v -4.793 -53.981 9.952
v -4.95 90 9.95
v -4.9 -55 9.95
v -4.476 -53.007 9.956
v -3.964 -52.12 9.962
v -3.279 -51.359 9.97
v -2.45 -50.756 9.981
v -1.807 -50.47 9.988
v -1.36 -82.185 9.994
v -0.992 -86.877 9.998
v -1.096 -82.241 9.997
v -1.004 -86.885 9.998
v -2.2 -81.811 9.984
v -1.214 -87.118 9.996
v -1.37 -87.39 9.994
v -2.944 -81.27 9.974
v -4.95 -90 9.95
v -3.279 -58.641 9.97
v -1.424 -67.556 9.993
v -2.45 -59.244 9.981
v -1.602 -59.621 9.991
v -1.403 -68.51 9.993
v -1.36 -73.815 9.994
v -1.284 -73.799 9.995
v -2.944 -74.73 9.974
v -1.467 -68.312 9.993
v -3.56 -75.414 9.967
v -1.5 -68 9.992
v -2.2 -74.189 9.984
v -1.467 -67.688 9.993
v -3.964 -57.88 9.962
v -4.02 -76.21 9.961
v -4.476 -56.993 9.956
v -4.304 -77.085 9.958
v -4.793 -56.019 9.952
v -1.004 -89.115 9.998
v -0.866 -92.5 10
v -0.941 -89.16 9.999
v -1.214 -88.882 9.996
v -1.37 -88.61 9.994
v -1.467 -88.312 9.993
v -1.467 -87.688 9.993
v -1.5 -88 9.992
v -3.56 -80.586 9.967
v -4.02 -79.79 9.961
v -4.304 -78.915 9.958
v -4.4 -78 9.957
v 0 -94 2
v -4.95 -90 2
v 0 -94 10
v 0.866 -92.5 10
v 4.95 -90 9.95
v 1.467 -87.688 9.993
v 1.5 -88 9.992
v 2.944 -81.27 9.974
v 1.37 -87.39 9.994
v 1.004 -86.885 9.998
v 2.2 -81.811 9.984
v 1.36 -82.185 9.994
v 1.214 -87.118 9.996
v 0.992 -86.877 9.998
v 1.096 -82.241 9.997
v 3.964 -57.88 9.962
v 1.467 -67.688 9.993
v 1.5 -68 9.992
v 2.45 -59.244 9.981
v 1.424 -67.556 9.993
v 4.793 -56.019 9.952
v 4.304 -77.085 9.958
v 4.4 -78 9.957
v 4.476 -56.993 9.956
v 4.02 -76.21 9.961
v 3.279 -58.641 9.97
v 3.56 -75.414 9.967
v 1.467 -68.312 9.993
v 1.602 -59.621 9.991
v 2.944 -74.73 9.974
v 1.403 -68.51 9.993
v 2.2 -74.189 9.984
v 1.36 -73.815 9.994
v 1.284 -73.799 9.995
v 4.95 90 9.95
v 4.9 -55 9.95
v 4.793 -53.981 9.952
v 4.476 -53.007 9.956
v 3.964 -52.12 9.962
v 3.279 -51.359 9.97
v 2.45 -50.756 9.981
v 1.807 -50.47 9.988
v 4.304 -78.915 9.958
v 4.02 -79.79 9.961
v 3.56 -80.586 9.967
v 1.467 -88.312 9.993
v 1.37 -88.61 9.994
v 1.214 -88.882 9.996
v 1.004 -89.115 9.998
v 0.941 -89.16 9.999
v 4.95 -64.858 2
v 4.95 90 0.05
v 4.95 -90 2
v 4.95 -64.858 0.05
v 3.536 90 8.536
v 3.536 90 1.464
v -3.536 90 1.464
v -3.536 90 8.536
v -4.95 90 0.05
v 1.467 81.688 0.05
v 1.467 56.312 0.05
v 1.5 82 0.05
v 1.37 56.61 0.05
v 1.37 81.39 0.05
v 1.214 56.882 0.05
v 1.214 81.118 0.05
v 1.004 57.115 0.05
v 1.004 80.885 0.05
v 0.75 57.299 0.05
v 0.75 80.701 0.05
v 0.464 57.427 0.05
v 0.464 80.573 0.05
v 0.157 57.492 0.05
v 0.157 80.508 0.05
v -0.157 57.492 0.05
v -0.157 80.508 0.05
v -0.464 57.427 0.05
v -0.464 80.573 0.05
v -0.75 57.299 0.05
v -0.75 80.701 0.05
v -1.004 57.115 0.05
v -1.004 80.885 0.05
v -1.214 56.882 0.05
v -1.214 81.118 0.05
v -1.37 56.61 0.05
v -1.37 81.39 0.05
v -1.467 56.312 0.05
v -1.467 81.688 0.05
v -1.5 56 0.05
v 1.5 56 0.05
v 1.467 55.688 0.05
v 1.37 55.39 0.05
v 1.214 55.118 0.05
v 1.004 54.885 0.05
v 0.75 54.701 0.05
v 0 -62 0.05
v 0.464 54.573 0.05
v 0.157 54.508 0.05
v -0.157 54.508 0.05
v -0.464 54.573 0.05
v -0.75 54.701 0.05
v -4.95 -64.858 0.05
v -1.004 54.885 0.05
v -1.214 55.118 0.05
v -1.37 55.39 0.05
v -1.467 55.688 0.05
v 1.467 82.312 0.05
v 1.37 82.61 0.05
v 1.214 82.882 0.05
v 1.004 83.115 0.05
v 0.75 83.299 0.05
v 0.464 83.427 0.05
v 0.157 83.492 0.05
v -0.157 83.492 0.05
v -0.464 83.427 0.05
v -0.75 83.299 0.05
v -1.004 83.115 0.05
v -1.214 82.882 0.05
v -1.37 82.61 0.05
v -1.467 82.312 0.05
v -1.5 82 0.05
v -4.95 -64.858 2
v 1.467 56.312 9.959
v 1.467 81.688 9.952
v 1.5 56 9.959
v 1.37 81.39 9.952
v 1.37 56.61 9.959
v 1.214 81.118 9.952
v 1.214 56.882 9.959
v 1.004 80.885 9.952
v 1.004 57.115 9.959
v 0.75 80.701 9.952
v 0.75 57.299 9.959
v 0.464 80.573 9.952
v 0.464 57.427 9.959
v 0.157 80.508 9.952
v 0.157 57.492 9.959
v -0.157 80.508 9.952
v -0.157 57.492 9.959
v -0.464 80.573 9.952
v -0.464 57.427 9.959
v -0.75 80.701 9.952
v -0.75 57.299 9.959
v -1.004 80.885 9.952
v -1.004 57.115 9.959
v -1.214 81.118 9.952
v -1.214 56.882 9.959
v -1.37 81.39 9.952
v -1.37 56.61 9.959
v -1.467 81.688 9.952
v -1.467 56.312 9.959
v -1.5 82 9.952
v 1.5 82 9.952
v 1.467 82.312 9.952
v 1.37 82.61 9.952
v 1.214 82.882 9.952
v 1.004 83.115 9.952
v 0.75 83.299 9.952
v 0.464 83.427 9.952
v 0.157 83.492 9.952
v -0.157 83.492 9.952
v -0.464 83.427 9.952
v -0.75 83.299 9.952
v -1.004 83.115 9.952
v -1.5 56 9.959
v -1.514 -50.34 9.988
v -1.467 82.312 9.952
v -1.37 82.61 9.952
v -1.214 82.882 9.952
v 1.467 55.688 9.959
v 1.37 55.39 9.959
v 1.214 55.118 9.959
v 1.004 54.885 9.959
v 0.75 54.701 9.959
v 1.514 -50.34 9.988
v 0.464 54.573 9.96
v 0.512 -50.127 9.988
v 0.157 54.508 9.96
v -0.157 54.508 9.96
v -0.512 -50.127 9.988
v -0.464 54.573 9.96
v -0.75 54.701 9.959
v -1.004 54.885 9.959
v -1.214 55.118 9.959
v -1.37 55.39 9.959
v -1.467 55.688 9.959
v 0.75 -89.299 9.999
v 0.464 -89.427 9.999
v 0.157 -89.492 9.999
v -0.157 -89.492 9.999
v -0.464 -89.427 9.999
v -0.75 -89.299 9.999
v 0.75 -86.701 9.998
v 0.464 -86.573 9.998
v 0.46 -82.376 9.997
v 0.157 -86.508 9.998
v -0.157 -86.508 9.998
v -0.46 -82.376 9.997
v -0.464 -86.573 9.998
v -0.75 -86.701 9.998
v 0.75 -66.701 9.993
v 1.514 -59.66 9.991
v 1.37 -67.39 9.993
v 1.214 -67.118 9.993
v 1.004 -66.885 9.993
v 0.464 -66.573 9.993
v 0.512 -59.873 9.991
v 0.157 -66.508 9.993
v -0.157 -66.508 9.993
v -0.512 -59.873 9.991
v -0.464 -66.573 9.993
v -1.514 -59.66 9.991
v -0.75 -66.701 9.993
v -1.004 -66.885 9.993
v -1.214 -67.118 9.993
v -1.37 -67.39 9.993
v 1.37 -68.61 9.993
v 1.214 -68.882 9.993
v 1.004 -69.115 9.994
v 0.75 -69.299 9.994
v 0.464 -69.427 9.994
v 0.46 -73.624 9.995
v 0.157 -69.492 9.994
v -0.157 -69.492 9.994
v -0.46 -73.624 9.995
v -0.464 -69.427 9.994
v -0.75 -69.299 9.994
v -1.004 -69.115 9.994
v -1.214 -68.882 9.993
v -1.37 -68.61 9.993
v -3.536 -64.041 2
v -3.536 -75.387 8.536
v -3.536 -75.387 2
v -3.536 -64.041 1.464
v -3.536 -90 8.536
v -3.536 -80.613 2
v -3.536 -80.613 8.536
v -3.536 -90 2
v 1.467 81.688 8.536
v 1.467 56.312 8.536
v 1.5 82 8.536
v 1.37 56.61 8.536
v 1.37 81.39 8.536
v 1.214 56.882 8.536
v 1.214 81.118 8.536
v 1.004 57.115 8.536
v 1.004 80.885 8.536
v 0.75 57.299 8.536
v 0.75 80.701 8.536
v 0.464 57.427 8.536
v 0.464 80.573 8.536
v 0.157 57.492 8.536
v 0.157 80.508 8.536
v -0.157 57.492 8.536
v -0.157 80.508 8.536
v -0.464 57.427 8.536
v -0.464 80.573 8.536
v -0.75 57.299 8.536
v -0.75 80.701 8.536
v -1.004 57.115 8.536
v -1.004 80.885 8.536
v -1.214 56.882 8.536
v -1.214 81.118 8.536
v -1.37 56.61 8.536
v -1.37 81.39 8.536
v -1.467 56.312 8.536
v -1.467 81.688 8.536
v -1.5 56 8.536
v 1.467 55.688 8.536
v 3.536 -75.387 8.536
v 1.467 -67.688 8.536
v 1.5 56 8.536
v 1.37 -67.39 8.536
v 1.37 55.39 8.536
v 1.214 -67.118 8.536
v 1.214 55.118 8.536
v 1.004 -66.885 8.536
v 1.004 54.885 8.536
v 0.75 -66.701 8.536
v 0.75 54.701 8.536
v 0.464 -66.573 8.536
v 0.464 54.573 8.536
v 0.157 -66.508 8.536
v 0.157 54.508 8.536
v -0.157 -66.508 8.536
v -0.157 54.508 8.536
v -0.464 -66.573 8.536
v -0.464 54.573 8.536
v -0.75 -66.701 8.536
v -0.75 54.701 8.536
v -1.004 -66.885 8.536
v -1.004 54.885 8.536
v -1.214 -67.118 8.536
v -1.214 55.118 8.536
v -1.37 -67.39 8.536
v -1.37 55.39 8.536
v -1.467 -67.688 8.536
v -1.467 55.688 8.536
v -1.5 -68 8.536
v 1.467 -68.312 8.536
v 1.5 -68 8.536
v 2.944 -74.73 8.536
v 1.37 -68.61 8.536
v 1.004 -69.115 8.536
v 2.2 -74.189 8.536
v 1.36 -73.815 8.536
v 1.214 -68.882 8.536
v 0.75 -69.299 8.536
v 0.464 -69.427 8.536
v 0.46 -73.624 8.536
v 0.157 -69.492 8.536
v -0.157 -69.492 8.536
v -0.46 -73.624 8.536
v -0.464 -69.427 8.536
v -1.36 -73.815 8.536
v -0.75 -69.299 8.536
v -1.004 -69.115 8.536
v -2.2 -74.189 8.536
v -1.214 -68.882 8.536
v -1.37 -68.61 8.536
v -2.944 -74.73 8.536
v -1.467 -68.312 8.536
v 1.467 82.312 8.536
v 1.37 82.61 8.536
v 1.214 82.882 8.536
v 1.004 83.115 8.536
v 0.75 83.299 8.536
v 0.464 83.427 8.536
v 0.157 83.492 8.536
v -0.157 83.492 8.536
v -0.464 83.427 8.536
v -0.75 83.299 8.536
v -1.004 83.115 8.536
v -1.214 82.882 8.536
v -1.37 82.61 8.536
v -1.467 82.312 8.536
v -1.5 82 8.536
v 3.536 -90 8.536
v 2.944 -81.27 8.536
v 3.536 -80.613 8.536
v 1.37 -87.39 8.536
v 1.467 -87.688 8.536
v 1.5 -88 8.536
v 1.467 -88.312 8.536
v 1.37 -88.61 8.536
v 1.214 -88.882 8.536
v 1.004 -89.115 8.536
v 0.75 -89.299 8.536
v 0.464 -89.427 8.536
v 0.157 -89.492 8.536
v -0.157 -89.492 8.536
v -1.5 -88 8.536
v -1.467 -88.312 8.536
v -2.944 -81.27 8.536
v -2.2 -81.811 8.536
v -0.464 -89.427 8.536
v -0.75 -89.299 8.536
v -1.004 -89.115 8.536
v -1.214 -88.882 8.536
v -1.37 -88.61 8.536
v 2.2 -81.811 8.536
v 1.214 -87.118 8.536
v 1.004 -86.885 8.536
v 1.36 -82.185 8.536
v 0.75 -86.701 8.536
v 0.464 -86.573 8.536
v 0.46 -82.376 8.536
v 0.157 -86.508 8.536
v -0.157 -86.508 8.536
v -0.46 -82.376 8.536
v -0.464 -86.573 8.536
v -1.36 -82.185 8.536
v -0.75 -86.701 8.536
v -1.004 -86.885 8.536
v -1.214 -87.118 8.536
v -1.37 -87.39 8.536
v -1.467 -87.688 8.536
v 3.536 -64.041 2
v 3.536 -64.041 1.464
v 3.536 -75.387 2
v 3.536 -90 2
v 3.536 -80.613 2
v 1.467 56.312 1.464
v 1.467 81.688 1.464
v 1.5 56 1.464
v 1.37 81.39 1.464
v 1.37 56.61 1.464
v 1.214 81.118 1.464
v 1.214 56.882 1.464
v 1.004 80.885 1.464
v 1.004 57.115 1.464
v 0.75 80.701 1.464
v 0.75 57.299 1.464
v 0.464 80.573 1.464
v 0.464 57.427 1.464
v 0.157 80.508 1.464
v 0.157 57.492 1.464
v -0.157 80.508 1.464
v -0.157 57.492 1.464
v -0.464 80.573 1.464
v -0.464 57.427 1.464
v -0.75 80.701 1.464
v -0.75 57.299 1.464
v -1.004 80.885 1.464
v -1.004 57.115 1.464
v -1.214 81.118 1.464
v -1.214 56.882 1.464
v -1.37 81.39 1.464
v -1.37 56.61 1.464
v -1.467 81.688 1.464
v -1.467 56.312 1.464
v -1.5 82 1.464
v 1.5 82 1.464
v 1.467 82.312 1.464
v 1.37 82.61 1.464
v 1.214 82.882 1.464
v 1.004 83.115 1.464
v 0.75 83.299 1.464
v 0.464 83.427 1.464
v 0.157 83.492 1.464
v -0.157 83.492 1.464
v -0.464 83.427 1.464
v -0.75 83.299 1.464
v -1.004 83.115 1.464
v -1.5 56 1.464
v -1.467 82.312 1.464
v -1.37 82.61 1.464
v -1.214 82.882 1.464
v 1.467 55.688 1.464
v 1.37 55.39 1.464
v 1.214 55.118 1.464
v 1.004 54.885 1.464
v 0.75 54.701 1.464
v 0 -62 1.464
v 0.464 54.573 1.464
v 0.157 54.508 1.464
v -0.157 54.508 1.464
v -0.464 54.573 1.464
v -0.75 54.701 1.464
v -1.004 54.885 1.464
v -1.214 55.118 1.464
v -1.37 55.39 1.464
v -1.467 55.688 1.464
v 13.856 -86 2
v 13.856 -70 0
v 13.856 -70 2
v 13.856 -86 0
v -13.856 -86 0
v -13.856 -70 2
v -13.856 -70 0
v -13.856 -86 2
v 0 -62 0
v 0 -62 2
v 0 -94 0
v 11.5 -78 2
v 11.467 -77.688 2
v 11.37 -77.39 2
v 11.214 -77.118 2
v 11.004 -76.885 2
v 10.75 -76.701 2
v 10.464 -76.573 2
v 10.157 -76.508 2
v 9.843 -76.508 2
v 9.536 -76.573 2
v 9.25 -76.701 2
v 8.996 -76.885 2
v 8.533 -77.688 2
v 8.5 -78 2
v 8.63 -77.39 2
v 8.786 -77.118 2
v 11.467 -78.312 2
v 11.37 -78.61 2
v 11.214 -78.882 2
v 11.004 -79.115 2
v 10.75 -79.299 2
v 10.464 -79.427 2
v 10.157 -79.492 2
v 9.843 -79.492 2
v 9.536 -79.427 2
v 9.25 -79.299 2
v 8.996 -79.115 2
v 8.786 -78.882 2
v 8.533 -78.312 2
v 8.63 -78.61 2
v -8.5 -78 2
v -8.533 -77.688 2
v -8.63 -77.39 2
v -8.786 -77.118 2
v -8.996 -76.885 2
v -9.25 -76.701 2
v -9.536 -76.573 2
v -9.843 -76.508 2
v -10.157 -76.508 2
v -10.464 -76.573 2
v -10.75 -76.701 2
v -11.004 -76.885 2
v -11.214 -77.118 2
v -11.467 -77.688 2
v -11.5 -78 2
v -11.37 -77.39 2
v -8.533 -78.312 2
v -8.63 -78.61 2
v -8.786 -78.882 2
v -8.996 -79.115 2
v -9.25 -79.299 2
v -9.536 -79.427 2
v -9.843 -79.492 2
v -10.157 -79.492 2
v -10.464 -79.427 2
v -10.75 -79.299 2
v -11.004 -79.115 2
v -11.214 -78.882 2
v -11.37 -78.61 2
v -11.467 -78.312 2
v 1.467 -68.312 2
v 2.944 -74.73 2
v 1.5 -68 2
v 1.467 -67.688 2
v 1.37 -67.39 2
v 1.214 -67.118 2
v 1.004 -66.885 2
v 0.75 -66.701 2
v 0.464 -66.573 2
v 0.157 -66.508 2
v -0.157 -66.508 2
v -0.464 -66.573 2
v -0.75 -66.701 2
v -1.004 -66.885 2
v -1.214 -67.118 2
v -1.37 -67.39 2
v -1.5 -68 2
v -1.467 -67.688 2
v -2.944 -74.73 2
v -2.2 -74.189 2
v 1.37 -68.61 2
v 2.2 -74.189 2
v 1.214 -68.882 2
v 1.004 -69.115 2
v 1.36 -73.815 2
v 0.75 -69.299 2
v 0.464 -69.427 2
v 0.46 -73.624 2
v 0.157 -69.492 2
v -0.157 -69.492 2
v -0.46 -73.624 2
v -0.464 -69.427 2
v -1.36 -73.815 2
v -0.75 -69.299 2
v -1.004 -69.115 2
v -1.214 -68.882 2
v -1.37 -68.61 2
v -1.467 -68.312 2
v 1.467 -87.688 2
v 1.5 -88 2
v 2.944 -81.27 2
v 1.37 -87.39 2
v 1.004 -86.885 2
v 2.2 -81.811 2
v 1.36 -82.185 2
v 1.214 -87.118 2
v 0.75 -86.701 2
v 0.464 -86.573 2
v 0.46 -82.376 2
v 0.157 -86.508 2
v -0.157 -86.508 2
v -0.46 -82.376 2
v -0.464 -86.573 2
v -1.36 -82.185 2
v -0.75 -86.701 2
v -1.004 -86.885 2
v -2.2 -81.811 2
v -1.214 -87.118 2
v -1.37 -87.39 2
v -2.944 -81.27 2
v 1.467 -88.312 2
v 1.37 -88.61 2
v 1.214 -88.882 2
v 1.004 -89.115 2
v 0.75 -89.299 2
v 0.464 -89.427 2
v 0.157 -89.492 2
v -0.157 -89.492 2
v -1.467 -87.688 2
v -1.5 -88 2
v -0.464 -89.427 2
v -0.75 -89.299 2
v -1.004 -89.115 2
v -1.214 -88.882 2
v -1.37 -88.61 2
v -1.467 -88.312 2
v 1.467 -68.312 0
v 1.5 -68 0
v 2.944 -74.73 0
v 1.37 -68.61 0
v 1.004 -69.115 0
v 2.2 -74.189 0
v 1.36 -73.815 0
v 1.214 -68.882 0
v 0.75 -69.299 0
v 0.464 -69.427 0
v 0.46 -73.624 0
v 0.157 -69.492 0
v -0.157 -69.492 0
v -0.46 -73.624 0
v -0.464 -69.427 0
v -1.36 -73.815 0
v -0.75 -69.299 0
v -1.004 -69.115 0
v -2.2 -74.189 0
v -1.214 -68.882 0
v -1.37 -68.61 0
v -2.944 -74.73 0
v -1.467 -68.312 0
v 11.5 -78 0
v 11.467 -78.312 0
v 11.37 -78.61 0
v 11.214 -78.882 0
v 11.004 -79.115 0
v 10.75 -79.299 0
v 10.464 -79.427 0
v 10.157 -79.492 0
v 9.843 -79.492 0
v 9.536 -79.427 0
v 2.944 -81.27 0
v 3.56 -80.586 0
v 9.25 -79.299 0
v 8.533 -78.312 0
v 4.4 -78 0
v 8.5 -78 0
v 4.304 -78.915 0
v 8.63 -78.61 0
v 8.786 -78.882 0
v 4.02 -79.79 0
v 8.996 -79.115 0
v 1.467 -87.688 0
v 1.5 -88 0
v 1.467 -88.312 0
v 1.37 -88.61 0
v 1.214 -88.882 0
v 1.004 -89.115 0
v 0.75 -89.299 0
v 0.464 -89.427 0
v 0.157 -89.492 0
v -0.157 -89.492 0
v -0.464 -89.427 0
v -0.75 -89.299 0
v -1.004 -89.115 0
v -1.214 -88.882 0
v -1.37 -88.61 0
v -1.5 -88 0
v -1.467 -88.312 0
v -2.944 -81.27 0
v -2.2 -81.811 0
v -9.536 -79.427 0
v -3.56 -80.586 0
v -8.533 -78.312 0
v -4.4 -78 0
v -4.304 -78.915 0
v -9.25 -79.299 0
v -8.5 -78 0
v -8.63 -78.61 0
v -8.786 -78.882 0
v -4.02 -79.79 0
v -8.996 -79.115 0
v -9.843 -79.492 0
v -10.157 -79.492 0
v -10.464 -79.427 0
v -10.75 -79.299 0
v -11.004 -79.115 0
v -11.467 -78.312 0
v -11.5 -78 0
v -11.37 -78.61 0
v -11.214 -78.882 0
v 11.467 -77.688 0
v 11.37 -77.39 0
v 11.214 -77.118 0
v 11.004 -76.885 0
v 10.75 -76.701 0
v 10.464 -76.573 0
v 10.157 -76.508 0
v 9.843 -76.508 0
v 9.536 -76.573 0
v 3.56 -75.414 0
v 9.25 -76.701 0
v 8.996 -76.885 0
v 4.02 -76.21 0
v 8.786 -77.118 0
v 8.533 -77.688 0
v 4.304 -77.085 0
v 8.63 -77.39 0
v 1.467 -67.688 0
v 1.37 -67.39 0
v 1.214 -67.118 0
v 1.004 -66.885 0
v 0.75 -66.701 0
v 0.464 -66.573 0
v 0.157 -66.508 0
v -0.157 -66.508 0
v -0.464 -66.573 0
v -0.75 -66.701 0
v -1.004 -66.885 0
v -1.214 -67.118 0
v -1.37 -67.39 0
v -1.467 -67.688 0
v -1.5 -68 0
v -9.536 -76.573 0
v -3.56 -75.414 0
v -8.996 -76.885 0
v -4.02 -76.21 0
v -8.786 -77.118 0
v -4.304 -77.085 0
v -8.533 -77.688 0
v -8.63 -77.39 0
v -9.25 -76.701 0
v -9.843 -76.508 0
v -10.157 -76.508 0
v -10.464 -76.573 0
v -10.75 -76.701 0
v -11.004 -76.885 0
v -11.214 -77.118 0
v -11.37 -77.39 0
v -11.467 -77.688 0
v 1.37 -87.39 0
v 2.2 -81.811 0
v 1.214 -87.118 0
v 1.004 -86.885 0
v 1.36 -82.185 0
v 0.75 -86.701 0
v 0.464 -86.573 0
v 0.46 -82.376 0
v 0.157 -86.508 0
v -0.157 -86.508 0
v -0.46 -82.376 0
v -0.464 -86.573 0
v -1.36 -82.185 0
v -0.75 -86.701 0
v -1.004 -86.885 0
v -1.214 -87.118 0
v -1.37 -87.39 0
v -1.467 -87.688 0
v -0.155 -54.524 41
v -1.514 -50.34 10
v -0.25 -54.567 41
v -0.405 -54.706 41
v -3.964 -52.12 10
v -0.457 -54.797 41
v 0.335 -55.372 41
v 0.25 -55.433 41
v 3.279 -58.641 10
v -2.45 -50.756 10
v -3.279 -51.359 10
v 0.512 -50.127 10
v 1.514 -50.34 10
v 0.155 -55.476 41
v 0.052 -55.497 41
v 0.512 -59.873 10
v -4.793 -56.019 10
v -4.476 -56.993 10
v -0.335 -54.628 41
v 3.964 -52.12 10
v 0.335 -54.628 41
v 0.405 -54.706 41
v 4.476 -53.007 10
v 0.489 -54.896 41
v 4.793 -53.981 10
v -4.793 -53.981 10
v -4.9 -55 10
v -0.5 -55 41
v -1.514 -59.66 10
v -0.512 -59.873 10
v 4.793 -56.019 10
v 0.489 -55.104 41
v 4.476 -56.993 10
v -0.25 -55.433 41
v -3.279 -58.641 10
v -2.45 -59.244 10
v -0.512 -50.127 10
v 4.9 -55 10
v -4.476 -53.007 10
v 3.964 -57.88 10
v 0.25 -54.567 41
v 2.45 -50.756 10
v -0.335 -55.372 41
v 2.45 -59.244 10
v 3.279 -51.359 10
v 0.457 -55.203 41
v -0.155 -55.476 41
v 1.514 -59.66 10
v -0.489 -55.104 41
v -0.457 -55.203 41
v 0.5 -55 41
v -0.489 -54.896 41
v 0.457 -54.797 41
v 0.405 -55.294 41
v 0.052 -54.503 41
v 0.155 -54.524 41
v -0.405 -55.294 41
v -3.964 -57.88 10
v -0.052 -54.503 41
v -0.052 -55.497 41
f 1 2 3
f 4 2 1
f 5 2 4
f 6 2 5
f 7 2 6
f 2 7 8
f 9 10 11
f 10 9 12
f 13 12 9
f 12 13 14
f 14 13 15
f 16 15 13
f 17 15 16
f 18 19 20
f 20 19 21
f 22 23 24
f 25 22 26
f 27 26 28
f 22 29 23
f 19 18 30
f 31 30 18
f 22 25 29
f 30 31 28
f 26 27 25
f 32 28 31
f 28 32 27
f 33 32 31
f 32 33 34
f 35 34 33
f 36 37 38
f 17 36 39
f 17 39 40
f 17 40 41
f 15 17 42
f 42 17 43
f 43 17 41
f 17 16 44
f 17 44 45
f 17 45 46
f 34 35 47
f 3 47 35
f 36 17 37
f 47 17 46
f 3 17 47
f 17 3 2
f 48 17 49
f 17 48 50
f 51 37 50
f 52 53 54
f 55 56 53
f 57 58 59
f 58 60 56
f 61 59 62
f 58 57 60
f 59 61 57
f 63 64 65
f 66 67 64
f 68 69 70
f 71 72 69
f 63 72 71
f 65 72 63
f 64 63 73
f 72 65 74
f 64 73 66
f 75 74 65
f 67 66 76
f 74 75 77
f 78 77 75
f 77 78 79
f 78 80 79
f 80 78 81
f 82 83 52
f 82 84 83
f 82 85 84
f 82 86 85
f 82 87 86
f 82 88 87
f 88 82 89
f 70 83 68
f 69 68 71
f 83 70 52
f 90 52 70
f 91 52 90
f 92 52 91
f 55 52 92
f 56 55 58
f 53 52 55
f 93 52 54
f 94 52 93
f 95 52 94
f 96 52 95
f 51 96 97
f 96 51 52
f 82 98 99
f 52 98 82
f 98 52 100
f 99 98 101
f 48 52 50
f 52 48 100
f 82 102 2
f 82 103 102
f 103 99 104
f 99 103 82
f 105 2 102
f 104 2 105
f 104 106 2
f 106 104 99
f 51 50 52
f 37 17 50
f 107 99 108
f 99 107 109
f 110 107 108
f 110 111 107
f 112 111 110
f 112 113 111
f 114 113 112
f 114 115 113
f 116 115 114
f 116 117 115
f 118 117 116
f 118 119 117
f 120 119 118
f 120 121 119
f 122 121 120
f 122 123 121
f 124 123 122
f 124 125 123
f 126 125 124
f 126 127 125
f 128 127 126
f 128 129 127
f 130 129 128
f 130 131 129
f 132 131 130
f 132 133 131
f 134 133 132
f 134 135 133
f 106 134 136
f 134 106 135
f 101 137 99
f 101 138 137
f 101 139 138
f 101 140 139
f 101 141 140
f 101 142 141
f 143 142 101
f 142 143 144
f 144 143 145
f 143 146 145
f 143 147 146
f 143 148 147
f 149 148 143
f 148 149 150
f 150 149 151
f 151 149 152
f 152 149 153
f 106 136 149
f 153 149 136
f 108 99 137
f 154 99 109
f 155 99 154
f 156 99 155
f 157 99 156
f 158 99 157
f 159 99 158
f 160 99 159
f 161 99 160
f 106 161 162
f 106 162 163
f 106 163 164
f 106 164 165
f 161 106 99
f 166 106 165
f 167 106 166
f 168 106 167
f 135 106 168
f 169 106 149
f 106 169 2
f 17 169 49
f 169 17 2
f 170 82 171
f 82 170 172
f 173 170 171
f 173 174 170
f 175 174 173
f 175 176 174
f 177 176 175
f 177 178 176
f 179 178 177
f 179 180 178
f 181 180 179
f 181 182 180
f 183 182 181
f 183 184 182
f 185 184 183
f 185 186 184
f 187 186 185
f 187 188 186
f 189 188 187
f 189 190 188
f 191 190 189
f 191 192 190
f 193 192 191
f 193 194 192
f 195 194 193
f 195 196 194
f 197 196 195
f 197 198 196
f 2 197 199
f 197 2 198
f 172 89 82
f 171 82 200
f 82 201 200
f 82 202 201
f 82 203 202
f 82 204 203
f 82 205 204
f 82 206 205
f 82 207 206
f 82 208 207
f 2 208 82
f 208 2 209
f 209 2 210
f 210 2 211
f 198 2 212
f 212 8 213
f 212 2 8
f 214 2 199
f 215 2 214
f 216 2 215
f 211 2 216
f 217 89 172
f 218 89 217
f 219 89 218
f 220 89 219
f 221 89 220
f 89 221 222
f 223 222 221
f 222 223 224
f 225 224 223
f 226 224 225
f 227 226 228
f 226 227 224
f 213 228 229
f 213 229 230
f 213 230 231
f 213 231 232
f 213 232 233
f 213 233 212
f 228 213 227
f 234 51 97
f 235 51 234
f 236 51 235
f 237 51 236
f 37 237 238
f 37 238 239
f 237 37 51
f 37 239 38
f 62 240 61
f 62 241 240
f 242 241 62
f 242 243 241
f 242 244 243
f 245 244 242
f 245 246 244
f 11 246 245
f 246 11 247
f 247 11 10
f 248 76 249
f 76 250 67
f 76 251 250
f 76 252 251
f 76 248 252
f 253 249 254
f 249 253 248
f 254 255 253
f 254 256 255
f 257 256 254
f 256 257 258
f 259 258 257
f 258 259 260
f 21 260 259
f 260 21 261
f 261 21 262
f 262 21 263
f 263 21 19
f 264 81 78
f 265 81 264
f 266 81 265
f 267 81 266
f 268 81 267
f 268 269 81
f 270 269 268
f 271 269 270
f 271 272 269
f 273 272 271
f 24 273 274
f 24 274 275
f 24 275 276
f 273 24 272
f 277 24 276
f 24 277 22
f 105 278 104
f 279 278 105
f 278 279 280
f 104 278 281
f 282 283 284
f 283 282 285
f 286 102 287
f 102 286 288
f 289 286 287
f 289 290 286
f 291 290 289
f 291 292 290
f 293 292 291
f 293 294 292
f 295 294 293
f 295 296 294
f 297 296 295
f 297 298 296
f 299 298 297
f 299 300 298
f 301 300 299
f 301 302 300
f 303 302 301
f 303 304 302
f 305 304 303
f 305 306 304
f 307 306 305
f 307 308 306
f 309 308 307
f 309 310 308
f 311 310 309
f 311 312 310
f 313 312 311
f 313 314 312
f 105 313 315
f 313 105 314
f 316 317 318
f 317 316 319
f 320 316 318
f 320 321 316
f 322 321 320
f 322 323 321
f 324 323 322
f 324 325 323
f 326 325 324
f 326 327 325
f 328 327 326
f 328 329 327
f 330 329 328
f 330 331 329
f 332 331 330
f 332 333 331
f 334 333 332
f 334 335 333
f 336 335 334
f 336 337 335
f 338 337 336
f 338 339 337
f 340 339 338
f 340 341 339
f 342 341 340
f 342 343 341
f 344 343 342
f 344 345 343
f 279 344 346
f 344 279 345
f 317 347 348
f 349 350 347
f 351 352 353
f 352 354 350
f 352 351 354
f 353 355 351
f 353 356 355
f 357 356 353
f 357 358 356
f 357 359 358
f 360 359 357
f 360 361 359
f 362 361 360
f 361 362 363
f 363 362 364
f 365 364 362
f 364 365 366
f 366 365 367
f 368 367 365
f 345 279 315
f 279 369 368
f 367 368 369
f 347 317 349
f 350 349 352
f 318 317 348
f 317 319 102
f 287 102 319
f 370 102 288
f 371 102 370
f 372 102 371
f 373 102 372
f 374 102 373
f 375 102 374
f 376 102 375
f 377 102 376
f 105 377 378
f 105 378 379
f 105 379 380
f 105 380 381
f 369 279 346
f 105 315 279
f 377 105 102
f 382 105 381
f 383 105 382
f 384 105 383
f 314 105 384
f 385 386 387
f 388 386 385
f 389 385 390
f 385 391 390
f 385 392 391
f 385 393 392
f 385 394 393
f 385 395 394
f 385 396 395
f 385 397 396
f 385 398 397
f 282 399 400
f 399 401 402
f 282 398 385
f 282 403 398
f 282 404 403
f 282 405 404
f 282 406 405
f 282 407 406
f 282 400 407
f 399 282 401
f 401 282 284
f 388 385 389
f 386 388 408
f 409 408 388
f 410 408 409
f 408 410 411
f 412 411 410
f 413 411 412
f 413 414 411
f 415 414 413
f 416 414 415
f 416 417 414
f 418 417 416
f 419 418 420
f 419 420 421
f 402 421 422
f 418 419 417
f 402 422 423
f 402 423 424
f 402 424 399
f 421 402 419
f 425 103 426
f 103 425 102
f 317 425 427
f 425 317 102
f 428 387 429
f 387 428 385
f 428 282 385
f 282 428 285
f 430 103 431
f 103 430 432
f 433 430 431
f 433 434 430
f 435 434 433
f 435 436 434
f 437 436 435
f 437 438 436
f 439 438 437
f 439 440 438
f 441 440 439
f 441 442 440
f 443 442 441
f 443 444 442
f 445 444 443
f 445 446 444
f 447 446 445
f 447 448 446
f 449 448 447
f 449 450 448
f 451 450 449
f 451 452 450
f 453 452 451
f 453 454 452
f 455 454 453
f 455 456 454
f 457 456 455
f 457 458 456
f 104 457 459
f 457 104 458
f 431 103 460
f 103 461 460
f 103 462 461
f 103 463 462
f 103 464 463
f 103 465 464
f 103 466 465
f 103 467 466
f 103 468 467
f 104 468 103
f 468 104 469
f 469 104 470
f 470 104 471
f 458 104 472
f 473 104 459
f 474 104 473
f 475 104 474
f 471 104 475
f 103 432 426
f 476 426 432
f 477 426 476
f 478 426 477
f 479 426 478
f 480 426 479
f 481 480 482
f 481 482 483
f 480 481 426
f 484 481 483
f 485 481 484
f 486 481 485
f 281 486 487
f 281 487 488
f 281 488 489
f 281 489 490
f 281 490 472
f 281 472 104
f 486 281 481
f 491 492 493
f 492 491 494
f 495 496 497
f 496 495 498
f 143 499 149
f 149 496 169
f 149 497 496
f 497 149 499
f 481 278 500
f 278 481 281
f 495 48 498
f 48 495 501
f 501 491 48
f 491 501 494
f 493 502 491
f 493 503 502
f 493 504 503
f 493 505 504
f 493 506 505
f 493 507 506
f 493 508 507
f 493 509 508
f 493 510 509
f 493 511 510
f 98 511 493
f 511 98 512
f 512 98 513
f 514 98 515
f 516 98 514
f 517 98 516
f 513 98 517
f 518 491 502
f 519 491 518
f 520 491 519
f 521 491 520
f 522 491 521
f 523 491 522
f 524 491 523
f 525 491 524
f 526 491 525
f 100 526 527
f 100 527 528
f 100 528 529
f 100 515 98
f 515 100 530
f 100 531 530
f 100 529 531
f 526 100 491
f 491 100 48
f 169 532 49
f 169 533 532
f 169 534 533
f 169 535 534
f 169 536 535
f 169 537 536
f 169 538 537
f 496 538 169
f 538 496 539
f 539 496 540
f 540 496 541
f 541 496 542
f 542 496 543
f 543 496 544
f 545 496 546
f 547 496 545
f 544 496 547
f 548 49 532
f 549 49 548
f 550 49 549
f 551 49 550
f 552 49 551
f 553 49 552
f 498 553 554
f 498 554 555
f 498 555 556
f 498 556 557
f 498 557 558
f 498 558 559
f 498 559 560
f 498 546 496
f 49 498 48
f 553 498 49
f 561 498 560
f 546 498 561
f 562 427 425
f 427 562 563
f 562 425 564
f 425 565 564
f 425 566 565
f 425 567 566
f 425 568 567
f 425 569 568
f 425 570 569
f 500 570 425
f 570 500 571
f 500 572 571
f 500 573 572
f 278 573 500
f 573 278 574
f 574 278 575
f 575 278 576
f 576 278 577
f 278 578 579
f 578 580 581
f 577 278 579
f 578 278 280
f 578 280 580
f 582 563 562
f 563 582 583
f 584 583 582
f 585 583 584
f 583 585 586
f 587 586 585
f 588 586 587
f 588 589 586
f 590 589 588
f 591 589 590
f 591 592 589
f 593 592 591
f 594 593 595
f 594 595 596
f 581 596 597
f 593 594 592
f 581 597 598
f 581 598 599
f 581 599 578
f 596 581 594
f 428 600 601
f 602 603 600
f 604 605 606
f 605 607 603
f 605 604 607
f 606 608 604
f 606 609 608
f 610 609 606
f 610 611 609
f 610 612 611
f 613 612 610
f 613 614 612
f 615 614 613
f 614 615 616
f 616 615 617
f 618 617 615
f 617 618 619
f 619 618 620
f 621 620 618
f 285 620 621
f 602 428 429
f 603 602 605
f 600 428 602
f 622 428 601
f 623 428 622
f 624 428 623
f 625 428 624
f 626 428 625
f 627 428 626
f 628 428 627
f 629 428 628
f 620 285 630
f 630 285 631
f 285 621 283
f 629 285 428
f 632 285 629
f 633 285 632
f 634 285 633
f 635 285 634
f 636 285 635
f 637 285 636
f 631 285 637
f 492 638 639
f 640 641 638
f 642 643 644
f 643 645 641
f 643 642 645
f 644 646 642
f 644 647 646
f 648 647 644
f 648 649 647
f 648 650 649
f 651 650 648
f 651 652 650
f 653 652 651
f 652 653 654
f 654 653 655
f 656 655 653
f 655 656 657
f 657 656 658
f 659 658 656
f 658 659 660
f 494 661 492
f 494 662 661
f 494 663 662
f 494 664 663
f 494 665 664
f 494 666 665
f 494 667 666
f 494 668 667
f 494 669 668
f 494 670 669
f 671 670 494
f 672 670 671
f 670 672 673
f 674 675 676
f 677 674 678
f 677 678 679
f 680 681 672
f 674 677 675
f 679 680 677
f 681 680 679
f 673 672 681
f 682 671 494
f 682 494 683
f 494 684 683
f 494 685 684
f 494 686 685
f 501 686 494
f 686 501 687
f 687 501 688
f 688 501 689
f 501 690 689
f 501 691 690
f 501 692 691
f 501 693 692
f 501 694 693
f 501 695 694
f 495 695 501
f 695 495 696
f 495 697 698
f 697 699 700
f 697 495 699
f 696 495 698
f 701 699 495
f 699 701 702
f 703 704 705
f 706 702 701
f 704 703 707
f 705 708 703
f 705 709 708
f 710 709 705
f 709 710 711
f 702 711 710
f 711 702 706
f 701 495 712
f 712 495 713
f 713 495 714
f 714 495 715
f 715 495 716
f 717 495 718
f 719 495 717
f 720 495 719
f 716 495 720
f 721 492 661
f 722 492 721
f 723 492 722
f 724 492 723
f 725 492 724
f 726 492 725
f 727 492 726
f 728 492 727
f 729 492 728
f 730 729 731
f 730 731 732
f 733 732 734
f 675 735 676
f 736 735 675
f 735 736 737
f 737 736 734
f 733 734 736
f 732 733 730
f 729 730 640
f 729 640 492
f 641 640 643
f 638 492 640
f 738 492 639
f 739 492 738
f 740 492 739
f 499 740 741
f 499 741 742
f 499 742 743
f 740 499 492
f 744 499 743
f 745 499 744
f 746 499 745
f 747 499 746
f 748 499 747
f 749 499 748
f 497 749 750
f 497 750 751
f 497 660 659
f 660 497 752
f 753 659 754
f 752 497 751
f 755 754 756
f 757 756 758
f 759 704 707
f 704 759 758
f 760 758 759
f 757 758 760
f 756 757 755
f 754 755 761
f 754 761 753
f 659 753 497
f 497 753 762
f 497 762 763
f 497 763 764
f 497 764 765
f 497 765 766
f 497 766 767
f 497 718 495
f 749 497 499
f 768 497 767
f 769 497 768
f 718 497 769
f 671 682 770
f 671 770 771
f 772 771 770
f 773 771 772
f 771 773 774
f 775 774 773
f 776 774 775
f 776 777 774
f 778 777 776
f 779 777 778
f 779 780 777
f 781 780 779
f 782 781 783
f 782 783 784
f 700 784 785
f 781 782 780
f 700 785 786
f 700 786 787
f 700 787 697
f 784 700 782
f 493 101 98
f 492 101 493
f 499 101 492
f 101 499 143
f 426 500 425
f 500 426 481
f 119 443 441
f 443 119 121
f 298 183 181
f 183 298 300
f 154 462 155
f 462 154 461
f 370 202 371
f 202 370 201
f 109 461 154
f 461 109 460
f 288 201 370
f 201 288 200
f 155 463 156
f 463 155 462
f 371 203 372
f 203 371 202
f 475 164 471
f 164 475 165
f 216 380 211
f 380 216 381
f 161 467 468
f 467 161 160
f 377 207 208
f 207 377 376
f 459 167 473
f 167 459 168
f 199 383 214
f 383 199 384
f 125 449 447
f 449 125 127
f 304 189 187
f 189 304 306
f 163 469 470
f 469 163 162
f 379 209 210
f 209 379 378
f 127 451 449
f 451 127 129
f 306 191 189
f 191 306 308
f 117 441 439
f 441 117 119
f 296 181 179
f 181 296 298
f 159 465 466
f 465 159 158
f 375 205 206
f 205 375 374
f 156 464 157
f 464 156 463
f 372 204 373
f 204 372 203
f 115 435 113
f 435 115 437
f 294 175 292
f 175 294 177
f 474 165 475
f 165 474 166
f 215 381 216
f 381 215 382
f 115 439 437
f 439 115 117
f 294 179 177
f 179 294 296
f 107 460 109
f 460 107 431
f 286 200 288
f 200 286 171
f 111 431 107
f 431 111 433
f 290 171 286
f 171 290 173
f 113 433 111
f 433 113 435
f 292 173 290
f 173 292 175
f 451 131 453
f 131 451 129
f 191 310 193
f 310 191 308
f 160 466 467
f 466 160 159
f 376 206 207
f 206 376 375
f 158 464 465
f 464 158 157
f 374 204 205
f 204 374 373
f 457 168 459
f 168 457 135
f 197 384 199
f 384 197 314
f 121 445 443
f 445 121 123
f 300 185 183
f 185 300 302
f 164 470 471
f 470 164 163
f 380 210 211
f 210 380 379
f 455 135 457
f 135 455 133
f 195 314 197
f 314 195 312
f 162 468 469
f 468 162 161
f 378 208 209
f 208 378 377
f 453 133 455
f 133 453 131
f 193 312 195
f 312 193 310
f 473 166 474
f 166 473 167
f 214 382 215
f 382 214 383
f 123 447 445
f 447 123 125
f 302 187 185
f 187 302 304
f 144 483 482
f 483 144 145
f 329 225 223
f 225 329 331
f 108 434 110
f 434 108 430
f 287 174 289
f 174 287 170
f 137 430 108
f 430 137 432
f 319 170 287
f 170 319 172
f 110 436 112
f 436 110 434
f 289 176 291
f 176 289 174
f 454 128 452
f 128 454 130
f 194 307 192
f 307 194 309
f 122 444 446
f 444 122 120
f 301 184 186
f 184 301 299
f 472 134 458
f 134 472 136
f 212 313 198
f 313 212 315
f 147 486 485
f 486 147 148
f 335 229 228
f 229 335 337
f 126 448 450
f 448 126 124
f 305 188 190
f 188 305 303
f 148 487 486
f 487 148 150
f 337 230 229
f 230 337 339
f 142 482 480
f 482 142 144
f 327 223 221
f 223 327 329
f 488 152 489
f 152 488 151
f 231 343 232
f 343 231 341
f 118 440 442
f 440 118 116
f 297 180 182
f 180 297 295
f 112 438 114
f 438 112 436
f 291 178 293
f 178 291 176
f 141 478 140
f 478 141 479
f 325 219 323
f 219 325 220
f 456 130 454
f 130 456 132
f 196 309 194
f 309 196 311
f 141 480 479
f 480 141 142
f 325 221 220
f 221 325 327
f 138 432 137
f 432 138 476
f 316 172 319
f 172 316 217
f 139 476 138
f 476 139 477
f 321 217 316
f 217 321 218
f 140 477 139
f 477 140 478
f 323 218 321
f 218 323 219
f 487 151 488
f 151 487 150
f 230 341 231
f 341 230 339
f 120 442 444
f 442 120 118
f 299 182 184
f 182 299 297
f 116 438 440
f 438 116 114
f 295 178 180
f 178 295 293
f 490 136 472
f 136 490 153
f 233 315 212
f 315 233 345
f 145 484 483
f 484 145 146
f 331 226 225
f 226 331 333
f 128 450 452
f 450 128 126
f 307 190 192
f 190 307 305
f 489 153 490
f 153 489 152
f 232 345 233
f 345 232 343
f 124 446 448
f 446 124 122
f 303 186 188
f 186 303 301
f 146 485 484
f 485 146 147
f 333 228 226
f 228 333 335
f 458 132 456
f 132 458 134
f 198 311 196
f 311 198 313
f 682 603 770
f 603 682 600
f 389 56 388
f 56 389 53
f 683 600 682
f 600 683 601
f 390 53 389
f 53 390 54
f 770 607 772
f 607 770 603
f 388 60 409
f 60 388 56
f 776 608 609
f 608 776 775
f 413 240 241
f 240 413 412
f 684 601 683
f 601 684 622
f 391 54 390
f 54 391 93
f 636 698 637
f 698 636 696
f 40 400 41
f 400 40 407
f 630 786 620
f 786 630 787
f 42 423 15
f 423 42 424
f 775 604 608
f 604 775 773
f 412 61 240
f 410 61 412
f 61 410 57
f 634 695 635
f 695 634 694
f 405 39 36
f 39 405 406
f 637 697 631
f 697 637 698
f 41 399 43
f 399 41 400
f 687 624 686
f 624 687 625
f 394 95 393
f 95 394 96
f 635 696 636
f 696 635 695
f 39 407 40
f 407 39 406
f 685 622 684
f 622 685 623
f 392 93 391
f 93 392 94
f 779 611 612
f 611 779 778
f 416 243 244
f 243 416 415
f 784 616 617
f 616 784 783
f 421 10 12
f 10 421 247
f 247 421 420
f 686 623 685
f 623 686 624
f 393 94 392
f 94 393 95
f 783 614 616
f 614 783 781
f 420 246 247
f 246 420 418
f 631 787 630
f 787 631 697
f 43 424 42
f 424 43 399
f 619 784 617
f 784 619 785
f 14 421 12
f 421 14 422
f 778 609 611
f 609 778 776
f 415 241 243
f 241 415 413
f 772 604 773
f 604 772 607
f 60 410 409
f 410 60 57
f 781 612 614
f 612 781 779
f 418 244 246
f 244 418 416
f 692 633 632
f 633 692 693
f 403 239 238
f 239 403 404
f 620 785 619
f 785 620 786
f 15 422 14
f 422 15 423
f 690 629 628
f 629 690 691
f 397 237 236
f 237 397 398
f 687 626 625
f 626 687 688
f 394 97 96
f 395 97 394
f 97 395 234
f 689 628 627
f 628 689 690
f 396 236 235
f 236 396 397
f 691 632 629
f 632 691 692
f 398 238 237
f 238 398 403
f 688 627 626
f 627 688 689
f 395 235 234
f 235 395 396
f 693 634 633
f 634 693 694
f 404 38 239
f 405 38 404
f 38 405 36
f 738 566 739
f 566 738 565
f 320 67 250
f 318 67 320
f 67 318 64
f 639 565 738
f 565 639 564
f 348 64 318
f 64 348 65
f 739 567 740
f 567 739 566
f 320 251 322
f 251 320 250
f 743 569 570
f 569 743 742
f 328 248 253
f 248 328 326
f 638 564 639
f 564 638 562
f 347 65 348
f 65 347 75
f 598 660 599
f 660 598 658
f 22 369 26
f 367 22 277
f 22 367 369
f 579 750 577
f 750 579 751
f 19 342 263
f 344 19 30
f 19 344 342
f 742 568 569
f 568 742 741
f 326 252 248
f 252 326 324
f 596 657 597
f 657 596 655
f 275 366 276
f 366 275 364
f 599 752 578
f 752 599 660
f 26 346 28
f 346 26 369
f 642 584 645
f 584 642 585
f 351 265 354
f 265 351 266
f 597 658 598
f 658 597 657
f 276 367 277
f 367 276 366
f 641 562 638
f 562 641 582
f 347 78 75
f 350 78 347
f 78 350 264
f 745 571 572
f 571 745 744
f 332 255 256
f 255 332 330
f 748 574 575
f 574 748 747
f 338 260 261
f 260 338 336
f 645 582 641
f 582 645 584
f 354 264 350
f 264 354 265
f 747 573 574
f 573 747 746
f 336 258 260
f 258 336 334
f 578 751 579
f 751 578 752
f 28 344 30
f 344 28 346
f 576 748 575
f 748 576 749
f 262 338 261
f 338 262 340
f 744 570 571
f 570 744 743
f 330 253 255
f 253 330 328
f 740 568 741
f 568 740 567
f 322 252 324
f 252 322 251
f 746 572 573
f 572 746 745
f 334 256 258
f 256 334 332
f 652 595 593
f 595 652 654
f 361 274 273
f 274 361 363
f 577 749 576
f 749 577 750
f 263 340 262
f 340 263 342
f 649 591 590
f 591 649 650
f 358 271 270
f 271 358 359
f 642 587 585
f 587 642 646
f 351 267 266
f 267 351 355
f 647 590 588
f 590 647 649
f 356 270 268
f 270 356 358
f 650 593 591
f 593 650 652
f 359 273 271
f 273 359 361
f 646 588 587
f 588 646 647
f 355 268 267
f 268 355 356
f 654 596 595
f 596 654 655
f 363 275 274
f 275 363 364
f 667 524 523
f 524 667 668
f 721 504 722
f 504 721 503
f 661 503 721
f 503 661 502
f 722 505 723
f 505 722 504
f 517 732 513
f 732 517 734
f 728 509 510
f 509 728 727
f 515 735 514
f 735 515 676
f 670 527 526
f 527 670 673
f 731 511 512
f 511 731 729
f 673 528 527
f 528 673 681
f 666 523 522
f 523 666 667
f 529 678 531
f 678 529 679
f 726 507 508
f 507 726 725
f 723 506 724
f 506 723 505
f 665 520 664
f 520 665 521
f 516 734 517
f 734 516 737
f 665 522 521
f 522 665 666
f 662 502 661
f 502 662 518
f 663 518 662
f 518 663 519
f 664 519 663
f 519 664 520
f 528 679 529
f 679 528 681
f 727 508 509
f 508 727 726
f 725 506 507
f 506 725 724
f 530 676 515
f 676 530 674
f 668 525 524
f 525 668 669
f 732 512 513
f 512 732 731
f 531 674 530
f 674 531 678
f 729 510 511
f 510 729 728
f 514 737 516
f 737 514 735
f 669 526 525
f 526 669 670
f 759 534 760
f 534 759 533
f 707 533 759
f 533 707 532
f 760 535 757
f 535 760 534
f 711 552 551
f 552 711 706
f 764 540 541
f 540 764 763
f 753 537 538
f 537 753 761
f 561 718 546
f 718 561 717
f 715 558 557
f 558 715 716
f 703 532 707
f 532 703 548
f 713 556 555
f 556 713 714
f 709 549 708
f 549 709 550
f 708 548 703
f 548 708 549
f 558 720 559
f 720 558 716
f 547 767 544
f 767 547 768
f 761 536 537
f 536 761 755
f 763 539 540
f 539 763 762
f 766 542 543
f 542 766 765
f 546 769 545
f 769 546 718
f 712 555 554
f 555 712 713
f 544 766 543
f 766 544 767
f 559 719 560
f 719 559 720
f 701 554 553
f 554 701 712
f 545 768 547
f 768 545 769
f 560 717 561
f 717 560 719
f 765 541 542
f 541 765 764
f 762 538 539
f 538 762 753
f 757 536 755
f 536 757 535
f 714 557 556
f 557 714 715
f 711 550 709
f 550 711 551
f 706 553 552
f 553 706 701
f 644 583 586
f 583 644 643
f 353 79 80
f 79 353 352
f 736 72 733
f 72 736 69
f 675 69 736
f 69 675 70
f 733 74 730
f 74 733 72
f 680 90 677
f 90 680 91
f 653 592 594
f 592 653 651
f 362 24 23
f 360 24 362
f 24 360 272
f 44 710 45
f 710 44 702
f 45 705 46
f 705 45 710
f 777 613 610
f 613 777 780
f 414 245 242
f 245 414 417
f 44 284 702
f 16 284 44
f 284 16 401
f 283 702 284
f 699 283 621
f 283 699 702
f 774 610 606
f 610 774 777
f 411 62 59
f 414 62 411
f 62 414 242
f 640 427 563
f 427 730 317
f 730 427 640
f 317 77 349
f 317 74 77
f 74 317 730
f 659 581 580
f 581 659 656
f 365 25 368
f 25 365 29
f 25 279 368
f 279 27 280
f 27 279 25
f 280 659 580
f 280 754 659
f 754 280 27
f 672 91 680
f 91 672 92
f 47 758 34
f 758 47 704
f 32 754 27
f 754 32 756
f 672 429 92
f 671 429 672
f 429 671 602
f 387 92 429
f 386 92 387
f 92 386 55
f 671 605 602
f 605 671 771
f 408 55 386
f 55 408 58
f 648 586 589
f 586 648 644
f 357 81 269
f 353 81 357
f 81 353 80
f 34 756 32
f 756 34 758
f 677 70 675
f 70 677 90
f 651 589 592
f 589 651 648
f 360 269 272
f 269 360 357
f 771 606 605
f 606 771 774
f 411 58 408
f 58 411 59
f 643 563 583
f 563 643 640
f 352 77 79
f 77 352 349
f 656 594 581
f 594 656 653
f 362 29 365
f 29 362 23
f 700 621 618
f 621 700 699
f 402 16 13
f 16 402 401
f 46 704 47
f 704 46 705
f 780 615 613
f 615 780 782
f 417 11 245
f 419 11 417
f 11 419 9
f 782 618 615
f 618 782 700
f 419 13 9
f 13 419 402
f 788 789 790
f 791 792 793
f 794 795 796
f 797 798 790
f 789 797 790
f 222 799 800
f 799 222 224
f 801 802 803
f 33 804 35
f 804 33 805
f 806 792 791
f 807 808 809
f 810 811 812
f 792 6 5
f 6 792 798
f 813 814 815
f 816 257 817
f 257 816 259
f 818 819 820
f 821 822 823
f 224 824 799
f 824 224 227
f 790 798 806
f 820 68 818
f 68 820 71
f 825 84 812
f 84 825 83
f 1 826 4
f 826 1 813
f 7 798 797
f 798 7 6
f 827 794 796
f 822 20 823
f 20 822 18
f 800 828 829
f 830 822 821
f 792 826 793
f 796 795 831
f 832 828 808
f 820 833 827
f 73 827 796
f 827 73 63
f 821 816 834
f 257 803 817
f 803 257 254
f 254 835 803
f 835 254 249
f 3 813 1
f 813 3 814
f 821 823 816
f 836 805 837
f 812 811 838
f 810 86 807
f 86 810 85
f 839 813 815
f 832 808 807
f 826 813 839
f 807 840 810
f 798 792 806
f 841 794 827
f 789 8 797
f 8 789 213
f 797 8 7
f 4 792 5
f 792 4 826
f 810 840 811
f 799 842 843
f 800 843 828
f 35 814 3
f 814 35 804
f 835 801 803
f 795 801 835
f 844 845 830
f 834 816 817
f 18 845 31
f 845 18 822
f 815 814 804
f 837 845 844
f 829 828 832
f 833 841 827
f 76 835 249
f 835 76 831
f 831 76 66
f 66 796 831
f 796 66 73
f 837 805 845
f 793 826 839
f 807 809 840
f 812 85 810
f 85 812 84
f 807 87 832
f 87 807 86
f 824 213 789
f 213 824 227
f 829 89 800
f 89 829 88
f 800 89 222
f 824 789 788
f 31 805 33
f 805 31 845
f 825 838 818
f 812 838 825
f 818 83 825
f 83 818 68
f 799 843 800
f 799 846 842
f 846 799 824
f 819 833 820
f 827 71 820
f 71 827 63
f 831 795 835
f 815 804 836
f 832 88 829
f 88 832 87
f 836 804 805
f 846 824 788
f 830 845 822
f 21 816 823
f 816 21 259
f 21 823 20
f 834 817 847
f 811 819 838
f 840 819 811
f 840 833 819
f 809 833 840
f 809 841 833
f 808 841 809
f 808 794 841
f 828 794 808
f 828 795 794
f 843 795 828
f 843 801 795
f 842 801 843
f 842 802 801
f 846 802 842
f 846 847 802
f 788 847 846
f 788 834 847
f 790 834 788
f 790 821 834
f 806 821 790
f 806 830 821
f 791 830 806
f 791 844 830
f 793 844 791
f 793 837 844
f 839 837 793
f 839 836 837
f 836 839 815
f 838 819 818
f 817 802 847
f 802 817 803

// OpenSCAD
// Eduardo Blanco Bielsa - UO285176
module tubo(h, d, fn, hull1, hull2, hull3){
    difference(){
        hull(){
            translate([0,90,5])
            rotate([90,-45,0])
            cylinder (h = h, d=d, $fn=fn);
          
        
            translate([0,-93,2])
            rotate([0,0,30])
            cylinder (h = hull1, d=hull2, $fn=hull3);
        }
      
        translate([0,90,5])
        rotate([90,-45,0])
        cylinder (h = h, d=d-4, $fn=fn);
    }
}

module helice(h, d, fn, hc, dc, fnc, hcc, dcc, fncc, hh, dh, hull1, hull2, hull3){
    difference(){
        union(){
            translate([0,-78,0])
            rotate([0,0,90])
            cylinder (h = hc, d=dc, $fn=fnc);
            tubo(h, d, fn, hull1, hull2, hull3);
        }
        translate([0,82,0])
        cylinder (h = hcc, d=dcc, $fn=fncc);
        translate([0,56,0])
        cylinder (h = hcc, d=dcc, $fn=fncc);
        
        translate([0,-88,0])//hélice
        cylinder (h = hcc, d=dcc, $fn=fncc);
        translate([0,-68,0])
        cylinder (h = hcc, d=dcc, $fn=fncc);
        translate([10,-78,0])
        cylinder (h = hcc, d=dcc, $fn=fncc);
        translate([-10,-78,0])
        cylinder (h = hcc, d=dcc, $fn=fncc);
        
        translate([0,-78,0])
        cylinder (h = hcc*2, d=dcc+5.8, $fn=fncc);
}
hull(){
    translate([0,-55,9])
    cylinder (h = hh, d=dh, $fn=fncc);
    translate([0,-55,11])
    cylinder (h = hh+29, d=1, $fn=fncc);
}
}

helice(180,14,4, 2,32,6, 10,3,30, 1, 9.8, 8, 2, 3);
